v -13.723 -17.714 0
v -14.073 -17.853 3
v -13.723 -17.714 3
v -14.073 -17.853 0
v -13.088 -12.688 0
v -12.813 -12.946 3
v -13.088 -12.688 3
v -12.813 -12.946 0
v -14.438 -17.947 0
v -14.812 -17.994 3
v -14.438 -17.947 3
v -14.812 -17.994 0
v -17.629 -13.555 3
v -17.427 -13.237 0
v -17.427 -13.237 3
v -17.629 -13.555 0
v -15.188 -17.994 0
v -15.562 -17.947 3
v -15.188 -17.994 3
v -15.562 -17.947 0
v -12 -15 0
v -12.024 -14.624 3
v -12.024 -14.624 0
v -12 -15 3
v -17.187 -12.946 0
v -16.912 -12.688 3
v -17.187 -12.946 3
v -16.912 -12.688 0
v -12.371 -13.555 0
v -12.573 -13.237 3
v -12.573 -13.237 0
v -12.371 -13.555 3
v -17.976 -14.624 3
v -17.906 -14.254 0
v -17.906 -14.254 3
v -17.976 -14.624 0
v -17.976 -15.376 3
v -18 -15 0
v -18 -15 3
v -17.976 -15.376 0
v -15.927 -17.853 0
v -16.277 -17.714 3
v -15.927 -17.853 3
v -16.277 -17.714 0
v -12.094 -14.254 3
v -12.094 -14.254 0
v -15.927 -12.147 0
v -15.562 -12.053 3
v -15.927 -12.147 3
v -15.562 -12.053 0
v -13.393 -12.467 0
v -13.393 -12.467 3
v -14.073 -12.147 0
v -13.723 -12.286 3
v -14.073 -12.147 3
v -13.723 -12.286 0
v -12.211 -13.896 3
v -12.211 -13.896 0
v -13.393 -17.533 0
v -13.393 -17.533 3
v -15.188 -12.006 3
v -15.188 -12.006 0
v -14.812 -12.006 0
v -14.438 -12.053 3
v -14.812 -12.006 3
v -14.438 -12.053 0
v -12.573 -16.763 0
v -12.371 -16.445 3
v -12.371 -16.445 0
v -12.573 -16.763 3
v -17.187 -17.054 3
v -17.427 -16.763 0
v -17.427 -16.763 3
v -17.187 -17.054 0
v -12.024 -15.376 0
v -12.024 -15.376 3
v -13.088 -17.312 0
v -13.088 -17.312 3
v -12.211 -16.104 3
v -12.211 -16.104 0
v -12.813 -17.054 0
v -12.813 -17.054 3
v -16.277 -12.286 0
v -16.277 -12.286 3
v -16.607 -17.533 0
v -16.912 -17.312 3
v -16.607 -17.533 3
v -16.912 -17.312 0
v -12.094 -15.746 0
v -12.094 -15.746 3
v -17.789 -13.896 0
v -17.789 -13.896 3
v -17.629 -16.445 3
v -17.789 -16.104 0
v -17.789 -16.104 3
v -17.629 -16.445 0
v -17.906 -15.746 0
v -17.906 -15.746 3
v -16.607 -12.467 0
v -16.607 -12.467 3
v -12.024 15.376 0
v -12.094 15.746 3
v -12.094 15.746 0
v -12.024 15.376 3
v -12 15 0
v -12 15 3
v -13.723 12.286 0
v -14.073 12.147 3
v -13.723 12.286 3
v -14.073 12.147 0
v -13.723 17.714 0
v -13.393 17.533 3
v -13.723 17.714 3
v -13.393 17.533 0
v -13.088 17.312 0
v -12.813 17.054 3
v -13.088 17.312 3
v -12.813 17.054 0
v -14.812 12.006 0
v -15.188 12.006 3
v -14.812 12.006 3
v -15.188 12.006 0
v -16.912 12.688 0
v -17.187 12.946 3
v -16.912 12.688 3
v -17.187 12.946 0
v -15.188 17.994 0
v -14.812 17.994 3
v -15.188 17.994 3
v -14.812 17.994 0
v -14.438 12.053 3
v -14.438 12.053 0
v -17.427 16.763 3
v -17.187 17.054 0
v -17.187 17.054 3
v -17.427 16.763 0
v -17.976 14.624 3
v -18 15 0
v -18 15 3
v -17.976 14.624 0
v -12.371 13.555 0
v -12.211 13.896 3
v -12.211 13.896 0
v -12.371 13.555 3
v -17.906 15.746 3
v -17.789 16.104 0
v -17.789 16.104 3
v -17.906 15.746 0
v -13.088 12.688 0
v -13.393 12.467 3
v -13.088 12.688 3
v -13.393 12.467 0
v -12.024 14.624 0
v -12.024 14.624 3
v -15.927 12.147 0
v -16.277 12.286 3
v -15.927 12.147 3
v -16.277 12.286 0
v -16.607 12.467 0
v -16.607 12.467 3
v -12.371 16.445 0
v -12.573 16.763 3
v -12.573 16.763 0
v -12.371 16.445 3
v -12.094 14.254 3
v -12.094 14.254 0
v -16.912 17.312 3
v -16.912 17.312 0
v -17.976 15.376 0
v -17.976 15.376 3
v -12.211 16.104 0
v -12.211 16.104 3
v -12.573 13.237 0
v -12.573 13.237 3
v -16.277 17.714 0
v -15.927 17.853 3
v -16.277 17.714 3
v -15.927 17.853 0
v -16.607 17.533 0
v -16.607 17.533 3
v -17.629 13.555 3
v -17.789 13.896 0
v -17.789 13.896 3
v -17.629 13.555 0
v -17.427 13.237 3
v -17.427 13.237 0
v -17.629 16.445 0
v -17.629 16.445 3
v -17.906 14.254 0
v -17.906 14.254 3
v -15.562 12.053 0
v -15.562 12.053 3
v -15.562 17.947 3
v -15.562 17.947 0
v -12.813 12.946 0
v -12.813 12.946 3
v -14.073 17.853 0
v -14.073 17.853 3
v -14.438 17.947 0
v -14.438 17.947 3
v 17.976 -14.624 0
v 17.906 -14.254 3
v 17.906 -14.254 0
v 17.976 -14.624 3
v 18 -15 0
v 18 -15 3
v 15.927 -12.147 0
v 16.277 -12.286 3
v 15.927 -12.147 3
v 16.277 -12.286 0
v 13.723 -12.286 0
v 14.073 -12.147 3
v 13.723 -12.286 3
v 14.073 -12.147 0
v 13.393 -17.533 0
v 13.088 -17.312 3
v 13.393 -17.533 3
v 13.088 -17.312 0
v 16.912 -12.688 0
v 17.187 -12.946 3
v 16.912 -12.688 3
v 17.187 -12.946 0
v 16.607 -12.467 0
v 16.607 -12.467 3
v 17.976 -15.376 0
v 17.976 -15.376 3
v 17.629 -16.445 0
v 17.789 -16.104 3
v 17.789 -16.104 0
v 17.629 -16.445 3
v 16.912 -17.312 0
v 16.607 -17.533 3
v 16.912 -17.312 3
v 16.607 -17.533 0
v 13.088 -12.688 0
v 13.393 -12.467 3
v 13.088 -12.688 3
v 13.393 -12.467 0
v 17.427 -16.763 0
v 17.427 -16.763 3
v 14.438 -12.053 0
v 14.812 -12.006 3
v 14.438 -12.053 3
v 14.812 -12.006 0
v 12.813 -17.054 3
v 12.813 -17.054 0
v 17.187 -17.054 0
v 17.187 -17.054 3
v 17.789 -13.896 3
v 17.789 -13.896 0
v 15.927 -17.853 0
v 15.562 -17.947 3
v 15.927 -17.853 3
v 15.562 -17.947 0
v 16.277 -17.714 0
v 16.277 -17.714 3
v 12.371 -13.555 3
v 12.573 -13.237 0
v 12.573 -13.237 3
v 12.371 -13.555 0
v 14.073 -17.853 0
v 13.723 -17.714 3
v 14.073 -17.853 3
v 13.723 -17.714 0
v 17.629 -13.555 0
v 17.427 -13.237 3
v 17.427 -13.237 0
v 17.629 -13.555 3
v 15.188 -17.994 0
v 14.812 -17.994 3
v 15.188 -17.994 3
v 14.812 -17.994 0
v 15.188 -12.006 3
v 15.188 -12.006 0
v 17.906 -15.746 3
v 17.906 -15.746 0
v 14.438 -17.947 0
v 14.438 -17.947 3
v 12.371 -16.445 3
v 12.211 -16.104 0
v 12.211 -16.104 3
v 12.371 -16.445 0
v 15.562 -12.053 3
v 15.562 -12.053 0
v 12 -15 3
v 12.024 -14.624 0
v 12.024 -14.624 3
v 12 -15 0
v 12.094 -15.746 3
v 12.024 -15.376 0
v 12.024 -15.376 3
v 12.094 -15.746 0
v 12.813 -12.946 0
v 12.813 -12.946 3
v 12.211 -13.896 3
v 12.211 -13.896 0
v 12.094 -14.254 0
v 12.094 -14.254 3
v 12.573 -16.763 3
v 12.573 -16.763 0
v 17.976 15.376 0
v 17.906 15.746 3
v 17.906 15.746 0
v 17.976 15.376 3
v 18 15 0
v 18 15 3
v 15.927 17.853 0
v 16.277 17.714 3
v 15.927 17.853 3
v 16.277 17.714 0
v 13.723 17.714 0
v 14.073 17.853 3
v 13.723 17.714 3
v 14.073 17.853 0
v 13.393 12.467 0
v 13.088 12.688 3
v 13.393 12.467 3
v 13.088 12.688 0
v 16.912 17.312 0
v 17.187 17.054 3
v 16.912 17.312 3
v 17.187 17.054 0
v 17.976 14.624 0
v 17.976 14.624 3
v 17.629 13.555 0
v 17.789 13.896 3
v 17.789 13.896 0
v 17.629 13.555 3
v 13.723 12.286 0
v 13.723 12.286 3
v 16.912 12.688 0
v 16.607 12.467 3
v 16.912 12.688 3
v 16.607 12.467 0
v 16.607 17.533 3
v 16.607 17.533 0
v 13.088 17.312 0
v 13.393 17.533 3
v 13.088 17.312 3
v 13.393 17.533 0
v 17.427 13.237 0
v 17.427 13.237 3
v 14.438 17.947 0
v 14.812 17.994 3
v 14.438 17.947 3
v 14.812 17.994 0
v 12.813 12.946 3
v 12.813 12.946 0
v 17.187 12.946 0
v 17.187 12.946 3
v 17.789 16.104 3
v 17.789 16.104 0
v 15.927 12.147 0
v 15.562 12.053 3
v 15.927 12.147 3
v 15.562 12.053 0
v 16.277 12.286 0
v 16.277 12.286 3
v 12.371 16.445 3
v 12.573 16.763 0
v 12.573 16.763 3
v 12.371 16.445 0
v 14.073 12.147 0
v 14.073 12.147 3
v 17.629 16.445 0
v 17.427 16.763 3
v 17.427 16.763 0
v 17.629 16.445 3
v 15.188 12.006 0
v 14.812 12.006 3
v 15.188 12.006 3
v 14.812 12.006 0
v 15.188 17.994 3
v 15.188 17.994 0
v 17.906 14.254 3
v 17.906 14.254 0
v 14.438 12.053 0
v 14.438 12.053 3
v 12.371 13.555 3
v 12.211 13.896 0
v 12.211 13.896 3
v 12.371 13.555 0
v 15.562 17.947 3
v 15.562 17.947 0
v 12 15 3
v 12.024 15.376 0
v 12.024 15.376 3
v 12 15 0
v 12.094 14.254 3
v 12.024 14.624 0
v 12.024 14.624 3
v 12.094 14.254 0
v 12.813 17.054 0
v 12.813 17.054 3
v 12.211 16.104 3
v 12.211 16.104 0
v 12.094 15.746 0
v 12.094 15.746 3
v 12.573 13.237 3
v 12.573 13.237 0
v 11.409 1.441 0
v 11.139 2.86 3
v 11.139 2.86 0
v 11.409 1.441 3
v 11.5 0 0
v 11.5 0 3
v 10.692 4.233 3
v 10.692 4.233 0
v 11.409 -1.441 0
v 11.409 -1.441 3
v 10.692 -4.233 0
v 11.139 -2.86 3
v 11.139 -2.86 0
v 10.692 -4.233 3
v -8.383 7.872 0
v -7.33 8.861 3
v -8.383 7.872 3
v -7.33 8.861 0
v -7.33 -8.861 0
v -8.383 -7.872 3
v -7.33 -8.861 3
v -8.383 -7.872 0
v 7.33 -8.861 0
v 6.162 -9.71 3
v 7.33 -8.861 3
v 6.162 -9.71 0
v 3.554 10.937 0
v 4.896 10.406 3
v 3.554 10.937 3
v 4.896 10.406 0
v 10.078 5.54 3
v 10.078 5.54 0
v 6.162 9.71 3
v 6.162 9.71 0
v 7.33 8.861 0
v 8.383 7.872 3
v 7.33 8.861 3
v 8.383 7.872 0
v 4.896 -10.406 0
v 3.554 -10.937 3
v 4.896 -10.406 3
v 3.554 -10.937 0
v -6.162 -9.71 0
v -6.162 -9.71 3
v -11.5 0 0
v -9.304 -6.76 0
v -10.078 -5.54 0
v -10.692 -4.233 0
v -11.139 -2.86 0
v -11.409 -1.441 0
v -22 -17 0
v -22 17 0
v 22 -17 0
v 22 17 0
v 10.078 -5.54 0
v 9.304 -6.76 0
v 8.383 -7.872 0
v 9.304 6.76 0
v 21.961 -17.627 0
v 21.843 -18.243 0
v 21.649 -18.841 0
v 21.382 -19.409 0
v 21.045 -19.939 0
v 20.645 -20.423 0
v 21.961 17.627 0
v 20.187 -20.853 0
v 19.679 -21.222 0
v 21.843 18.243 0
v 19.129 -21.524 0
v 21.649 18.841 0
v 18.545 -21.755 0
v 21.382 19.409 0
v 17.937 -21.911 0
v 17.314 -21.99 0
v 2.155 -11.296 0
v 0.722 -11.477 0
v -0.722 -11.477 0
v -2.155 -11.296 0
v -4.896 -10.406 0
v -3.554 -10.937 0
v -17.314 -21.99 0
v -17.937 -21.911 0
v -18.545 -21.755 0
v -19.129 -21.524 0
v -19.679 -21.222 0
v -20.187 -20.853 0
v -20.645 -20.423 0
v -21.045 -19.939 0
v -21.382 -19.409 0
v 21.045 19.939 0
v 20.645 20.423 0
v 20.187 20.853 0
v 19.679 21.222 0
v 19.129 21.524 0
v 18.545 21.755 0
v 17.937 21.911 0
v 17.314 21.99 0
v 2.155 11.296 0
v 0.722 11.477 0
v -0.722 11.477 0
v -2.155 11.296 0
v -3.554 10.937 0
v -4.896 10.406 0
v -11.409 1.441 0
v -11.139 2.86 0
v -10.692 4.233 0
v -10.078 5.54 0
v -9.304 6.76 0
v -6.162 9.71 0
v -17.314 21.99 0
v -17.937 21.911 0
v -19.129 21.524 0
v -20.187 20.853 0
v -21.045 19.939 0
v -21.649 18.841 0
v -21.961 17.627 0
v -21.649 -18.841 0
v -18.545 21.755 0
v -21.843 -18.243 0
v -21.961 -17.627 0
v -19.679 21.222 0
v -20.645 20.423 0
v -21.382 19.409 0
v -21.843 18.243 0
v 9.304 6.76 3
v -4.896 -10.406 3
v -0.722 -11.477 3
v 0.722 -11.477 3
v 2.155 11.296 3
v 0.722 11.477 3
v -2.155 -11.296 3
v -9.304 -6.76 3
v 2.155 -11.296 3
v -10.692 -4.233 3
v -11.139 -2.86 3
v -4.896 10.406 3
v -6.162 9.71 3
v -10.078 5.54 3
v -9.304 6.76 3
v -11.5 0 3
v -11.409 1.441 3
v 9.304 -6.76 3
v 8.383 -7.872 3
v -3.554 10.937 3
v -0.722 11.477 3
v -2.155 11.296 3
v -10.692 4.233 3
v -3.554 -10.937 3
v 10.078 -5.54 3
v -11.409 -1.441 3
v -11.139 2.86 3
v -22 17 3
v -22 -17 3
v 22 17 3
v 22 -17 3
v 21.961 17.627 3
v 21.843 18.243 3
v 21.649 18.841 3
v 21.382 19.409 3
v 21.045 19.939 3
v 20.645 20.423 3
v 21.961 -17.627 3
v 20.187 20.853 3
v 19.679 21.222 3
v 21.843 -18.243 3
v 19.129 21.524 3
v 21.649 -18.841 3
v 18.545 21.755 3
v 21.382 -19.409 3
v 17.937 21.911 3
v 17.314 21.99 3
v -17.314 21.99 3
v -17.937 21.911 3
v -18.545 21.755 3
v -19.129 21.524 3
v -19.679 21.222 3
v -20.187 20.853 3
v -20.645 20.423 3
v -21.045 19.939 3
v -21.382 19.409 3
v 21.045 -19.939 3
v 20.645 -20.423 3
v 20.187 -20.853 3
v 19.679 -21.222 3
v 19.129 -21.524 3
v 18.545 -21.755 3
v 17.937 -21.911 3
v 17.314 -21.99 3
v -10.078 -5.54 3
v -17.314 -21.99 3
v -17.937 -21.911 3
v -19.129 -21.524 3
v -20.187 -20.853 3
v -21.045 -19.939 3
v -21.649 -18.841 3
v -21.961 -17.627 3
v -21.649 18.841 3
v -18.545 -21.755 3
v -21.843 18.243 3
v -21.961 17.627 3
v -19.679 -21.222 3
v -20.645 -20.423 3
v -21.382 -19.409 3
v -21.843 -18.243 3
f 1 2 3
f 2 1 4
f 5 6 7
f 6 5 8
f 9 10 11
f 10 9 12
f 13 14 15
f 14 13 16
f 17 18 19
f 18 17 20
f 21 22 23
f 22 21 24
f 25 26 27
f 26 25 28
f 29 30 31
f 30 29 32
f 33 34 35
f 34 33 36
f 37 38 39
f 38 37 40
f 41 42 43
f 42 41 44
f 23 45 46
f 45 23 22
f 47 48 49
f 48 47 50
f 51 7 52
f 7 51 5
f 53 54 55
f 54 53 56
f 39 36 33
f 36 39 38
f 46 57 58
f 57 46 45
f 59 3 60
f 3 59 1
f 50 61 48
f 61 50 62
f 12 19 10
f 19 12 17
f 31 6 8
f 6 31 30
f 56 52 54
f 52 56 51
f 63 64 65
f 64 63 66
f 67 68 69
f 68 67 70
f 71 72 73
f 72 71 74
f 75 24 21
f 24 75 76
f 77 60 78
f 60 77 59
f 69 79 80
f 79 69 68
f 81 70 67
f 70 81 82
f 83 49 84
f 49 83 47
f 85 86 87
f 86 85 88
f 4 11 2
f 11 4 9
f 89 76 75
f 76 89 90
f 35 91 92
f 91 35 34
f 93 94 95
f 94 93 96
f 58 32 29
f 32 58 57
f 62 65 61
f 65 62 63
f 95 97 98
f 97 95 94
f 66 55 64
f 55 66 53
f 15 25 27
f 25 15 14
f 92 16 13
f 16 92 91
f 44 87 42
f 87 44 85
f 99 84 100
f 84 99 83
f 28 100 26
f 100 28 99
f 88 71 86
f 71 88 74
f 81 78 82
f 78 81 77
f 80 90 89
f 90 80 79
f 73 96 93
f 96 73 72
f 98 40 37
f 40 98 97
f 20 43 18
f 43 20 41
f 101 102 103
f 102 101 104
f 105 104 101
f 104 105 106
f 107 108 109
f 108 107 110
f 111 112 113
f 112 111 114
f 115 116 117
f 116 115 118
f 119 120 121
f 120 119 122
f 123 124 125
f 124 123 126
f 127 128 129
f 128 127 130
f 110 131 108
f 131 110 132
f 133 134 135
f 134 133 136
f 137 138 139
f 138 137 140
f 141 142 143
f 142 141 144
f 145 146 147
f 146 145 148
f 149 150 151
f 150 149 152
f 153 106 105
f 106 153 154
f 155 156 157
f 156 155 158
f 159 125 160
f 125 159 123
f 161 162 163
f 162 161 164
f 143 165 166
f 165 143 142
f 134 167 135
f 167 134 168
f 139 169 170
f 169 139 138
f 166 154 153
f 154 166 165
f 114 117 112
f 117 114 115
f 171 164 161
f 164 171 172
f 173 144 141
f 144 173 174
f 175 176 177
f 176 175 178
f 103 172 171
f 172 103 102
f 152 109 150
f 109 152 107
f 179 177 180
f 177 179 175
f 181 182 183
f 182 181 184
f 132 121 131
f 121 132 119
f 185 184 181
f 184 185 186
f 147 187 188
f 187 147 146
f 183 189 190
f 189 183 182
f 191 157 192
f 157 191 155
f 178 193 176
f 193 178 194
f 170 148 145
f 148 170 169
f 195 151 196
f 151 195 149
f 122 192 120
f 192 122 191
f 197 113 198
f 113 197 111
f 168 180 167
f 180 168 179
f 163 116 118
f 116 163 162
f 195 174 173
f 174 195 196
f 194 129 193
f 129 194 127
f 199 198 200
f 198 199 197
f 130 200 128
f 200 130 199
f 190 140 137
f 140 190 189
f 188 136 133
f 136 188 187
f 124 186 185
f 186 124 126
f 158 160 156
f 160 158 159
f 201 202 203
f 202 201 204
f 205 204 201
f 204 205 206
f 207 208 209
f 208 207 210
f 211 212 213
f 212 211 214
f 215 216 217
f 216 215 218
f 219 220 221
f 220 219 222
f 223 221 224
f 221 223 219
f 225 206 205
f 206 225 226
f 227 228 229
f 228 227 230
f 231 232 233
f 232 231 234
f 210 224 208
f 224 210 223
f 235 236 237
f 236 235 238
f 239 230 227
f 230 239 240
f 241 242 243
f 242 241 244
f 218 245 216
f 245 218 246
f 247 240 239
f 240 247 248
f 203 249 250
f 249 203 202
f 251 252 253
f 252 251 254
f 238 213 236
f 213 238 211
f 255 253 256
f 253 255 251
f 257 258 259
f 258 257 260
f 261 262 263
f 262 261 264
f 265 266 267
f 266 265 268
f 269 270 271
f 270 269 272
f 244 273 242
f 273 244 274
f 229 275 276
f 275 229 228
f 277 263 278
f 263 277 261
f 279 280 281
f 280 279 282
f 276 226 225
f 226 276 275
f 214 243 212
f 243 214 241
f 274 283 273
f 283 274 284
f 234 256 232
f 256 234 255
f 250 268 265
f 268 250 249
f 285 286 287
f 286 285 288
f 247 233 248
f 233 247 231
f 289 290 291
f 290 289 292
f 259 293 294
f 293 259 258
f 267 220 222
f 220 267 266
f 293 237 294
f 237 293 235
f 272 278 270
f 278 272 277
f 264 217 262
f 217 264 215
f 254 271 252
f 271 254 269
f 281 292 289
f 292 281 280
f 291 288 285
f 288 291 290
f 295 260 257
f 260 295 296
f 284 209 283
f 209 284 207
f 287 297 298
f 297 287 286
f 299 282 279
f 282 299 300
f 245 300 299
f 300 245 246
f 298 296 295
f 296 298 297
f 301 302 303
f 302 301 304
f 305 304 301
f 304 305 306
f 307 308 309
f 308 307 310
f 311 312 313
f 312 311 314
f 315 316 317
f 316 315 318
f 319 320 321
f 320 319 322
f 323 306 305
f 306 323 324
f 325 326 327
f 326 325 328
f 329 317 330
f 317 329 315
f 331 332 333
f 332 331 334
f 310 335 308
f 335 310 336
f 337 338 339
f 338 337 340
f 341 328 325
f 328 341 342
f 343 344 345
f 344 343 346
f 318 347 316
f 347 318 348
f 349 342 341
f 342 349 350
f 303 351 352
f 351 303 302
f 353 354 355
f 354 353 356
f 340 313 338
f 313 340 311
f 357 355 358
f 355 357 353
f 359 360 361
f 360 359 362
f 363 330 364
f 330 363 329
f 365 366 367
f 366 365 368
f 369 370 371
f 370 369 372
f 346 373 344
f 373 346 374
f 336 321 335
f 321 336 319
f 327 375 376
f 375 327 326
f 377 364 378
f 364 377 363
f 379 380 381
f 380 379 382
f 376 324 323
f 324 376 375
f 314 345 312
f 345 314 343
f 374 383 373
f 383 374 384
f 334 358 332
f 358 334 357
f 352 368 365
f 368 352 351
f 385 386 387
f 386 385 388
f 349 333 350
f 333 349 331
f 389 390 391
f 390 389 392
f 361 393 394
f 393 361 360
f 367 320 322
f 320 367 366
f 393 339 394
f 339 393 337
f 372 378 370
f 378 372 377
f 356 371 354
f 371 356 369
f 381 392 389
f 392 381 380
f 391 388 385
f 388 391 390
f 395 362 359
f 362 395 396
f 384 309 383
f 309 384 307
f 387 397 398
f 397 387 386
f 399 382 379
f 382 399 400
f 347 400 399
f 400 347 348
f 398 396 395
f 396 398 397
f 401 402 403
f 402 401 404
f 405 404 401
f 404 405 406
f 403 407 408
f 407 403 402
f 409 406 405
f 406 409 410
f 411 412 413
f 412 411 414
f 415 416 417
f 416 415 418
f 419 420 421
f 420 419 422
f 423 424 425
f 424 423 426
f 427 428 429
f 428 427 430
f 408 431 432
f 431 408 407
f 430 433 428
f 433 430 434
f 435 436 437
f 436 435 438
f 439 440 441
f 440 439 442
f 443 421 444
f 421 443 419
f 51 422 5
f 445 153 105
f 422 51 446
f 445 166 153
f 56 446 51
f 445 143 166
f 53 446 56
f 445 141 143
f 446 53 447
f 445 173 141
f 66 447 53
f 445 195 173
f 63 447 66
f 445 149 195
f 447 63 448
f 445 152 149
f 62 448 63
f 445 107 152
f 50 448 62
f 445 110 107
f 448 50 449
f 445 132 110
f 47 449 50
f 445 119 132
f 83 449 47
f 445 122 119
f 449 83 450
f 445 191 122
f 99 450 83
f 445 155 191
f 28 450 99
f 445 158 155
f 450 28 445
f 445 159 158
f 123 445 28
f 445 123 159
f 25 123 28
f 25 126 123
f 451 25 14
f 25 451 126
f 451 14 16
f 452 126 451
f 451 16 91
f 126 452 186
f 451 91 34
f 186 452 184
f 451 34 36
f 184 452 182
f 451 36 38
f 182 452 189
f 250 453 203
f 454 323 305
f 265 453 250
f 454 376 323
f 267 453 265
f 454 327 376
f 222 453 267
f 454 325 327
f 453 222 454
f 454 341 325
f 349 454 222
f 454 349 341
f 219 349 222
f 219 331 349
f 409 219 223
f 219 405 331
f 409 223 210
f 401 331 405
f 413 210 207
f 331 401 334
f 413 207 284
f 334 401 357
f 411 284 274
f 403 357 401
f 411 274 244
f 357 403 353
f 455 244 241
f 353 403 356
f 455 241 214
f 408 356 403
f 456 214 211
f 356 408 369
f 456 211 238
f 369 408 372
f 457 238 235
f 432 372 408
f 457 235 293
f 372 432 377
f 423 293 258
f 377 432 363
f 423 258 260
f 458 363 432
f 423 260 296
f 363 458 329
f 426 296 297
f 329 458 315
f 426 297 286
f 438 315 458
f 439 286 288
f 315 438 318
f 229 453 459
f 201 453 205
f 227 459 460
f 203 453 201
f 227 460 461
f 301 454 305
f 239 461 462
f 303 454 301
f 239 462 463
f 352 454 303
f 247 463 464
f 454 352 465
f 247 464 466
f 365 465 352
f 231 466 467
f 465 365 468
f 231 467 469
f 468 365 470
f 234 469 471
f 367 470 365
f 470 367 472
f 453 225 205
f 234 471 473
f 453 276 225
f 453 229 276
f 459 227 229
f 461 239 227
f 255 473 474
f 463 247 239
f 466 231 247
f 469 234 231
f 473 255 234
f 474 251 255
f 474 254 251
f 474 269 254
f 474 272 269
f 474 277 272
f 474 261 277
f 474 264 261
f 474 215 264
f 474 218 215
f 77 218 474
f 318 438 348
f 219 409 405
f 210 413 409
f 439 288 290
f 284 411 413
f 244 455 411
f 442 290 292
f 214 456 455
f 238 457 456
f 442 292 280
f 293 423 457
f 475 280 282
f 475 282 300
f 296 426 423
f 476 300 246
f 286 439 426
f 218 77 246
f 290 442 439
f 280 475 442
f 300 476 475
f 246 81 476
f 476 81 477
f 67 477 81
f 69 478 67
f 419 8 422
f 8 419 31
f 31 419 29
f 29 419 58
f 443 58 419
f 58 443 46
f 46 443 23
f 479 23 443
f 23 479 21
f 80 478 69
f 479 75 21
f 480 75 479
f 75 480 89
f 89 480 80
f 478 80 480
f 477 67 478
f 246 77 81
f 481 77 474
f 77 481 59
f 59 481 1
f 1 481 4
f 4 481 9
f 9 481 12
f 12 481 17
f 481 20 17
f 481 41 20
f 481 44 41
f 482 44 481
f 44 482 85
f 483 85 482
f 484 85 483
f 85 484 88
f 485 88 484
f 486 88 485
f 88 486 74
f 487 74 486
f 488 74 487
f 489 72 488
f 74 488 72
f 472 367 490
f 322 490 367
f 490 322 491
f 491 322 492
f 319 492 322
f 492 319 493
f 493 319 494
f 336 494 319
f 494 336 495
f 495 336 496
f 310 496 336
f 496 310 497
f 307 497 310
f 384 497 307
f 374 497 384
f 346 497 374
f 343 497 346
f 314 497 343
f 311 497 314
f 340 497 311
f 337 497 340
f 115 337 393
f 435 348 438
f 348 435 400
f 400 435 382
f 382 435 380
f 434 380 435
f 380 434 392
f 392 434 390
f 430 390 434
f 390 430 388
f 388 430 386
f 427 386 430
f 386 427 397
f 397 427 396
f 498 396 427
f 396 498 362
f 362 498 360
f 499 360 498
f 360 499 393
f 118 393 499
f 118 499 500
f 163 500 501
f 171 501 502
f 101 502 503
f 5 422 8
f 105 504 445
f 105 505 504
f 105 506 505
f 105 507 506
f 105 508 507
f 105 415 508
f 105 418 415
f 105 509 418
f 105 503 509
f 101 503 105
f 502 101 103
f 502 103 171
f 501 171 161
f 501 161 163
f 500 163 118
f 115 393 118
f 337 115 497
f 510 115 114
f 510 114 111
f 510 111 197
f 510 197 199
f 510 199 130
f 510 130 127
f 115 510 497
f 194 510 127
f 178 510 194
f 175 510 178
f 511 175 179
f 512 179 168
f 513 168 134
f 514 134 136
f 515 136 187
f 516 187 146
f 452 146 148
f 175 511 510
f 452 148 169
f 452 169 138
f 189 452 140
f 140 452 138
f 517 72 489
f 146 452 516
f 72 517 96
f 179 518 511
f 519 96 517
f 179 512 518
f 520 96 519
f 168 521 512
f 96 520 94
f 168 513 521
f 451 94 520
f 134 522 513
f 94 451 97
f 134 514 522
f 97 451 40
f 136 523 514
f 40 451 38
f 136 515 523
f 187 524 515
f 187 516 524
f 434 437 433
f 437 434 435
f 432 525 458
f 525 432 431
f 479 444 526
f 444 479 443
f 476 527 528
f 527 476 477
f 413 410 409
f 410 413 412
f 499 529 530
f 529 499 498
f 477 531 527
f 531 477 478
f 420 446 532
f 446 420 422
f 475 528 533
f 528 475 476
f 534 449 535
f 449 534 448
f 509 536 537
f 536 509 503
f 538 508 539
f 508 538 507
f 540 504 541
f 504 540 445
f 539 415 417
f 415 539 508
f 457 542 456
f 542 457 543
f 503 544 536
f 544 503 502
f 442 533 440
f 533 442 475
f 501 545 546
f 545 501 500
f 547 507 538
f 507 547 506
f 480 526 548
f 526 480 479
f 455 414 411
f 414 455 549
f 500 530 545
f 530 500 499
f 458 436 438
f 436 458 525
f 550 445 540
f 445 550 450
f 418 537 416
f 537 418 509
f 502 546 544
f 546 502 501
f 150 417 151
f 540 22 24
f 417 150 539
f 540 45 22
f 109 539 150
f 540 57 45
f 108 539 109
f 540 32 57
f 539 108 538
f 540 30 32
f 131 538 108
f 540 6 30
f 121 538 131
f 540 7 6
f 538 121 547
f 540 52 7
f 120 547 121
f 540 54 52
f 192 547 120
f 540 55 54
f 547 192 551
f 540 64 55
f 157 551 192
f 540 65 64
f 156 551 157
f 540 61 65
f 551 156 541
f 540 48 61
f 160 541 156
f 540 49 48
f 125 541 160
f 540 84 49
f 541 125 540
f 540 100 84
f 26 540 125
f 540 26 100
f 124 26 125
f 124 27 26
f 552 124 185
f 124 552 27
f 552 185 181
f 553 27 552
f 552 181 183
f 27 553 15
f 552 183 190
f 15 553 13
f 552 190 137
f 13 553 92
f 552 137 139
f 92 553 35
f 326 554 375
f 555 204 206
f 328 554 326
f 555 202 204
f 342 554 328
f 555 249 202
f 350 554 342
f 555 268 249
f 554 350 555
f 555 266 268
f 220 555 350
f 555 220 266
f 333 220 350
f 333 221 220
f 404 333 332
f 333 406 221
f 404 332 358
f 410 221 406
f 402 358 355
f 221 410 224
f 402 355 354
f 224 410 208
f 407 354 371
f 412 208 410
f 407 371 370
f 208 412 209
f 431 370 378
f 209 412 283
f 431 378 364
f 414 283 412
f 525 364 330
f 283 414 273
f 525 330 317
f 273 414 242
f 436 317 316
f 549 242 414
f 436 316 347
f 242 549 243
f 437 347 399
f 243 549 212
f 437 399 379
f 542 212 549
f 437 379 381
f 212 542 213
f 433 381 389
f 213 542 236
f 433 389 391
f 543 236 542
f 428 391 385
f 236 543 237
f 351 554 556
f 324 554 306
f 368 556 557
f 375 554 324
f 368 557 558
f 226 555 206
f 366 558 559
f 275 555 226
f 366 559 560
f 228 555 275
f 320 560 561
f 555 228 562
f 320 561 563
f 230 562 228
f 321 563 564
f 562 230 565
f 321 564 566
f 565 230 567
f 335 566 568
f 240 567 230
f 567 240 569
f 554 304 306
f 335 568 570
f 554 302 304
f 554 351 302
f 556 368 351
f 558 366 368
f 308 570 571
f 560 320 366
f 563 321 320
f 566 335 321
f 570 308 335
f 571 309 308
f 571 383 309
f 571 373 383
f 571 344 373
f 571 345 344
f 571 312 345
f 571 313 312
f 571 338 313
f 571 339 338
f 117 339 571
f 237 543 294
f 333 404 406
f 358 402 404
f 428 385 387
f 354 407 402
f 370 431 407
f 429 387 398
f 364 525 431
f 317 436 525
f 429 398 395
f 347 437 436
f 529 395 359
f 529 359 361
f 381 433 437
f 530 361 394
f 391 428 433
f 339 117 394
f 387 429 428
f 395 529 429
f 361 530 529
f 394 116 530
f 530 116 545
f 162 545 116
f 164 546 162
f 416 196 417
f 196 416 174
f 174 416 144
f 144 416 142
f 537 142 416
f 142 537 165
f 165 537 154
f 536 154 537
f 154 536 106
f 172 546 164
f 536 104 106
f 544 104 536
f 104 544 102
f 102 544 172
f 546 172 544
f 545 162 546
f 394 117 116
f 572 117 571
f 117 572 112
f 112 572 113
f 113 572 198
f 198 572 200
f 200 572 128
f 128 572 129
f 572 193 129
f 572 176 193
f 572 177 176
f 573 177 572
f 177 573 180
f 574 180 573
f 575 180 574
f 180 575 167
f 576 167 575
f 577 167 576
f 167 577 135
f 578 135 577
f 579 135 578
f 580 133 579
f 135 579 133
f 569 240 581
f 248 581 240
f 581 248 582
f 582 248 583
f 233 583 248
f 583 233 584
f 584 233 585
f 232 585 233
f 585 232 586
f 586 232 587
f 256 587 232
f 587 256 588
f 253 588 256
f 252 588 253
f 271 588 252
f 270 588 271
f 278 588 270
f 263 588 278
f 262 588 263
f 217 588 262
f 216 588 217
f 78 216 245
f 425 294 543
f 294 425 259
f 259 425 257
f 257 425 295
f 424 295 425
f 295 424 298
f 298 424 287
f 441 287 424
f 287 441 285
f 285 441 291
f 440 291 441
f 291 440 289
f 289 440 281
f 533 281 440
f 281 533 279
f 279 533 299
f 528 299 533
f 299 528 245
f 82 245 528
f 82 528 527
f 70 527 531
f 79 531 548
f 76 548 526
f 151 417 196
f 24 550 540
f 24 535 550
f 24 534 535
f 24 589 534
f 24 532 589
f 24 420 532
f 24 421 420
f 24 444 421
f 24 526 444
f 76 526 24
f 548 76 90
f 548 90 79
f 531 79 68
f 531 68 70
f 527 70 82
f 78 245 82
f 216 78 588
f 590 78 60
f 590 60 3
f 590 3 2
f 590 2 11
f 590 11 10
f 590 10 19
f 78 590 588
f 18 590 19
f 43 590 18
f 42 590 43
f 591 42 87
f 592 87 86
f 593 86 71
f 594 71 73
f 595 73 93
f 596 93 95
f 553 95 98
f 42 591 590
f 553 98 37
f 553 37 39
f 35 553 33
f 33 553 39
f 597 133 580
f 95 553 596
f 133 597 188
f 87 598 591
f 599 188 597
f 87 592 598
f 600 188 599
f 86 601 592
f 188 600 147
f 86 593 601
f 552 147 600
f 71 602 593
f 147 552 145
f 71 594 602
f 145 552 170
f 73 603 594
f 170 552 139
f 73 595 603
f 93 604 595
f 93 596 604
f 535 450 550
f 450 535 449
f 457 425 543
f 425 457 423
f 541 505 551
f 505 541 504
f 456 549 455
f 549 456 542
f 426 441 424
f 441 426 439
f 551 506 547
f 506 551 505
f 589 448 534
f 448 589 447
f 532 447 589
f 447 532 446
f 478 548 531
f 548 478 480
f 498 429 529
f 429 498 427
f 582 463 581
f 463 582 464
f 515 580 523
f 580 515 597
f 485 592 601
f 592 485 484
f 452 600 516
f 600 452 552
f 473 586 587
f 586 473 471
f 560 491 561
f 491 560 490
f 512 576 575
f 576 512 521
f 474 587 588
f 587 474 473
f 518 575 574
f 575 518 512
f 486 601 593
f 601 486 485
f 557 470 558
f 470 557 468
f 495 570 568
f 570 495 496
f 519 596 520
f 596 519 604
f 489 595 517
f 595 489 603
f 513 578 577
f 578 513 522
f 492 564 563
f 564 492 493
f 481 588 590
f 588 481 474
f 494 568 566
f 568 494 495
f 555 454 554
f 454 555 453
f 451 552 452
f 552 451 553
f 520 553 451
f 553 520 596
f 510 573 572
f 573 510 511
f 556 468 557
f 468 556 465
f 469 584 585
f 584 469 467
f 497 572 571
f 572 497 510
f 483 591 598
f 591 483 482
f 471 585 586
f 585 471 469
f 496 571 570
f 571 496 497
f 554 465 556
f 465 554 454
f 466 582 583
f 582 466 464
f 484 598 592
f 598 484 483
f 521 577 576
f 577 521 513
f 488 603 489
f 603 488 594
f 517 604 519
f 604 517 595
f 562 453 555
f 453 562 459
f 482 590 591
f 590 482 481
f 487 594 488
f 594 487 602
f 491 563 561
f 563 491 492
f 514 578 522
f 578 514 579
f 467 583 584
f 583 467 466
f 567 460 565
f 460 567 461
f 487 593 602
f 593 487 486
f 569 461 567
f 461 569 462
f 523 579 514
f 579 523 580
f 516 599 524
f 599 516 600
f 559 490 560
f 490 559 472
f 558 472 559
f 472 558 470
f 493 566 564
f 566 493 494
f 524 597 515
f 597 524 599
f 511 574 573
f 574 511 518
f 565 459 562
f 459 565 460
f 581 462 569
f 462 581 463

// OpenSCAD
$fn = 50;


difference() {
	union() {
		hull() {
			translate(v = [-17.0000000000, 17.0000000000, 0]) {
				cylinder(h = 3, r = 5);
			}
			translate(v = [17.0000000000, 17.0000000000, 0]) {
				cylinder(h = 3, r = 5);
			}
			translate(v = [-17.0000000000, -17.0000000000, 0]) {
				cylinder(h = 3, r = 5);
			}
			translate(v = [17.0000000000, -17.0000000000, 0]) {
				cylinder(h = 3, r = 5);
			}
		}
	}
	union() {
		#translate(v = [-15.0000000000, -15.0000000000, -100.0000000000]) {
			cylinder(h = 200, r = 3.0000000000);
		}
		#translate(v = [-15.0000000000, 15.0000000000, -100.0000000000]) {
			cylinder(h = 200, r = 3.0000000000);
		}
		#translate(v = [15.0000000000, -15.0000000000, -100.0000000000]) {
			cylinder(h = 200, r = 3.0000000000);
		}
		#translate(v = [15.0000000000, 15.0000000000, -100.0000000000]) {
			cylinder(h = 200, r = 3.0000000000);
		}
		#cylinder(h = 3, r = 11.5000000000);
	}
}
